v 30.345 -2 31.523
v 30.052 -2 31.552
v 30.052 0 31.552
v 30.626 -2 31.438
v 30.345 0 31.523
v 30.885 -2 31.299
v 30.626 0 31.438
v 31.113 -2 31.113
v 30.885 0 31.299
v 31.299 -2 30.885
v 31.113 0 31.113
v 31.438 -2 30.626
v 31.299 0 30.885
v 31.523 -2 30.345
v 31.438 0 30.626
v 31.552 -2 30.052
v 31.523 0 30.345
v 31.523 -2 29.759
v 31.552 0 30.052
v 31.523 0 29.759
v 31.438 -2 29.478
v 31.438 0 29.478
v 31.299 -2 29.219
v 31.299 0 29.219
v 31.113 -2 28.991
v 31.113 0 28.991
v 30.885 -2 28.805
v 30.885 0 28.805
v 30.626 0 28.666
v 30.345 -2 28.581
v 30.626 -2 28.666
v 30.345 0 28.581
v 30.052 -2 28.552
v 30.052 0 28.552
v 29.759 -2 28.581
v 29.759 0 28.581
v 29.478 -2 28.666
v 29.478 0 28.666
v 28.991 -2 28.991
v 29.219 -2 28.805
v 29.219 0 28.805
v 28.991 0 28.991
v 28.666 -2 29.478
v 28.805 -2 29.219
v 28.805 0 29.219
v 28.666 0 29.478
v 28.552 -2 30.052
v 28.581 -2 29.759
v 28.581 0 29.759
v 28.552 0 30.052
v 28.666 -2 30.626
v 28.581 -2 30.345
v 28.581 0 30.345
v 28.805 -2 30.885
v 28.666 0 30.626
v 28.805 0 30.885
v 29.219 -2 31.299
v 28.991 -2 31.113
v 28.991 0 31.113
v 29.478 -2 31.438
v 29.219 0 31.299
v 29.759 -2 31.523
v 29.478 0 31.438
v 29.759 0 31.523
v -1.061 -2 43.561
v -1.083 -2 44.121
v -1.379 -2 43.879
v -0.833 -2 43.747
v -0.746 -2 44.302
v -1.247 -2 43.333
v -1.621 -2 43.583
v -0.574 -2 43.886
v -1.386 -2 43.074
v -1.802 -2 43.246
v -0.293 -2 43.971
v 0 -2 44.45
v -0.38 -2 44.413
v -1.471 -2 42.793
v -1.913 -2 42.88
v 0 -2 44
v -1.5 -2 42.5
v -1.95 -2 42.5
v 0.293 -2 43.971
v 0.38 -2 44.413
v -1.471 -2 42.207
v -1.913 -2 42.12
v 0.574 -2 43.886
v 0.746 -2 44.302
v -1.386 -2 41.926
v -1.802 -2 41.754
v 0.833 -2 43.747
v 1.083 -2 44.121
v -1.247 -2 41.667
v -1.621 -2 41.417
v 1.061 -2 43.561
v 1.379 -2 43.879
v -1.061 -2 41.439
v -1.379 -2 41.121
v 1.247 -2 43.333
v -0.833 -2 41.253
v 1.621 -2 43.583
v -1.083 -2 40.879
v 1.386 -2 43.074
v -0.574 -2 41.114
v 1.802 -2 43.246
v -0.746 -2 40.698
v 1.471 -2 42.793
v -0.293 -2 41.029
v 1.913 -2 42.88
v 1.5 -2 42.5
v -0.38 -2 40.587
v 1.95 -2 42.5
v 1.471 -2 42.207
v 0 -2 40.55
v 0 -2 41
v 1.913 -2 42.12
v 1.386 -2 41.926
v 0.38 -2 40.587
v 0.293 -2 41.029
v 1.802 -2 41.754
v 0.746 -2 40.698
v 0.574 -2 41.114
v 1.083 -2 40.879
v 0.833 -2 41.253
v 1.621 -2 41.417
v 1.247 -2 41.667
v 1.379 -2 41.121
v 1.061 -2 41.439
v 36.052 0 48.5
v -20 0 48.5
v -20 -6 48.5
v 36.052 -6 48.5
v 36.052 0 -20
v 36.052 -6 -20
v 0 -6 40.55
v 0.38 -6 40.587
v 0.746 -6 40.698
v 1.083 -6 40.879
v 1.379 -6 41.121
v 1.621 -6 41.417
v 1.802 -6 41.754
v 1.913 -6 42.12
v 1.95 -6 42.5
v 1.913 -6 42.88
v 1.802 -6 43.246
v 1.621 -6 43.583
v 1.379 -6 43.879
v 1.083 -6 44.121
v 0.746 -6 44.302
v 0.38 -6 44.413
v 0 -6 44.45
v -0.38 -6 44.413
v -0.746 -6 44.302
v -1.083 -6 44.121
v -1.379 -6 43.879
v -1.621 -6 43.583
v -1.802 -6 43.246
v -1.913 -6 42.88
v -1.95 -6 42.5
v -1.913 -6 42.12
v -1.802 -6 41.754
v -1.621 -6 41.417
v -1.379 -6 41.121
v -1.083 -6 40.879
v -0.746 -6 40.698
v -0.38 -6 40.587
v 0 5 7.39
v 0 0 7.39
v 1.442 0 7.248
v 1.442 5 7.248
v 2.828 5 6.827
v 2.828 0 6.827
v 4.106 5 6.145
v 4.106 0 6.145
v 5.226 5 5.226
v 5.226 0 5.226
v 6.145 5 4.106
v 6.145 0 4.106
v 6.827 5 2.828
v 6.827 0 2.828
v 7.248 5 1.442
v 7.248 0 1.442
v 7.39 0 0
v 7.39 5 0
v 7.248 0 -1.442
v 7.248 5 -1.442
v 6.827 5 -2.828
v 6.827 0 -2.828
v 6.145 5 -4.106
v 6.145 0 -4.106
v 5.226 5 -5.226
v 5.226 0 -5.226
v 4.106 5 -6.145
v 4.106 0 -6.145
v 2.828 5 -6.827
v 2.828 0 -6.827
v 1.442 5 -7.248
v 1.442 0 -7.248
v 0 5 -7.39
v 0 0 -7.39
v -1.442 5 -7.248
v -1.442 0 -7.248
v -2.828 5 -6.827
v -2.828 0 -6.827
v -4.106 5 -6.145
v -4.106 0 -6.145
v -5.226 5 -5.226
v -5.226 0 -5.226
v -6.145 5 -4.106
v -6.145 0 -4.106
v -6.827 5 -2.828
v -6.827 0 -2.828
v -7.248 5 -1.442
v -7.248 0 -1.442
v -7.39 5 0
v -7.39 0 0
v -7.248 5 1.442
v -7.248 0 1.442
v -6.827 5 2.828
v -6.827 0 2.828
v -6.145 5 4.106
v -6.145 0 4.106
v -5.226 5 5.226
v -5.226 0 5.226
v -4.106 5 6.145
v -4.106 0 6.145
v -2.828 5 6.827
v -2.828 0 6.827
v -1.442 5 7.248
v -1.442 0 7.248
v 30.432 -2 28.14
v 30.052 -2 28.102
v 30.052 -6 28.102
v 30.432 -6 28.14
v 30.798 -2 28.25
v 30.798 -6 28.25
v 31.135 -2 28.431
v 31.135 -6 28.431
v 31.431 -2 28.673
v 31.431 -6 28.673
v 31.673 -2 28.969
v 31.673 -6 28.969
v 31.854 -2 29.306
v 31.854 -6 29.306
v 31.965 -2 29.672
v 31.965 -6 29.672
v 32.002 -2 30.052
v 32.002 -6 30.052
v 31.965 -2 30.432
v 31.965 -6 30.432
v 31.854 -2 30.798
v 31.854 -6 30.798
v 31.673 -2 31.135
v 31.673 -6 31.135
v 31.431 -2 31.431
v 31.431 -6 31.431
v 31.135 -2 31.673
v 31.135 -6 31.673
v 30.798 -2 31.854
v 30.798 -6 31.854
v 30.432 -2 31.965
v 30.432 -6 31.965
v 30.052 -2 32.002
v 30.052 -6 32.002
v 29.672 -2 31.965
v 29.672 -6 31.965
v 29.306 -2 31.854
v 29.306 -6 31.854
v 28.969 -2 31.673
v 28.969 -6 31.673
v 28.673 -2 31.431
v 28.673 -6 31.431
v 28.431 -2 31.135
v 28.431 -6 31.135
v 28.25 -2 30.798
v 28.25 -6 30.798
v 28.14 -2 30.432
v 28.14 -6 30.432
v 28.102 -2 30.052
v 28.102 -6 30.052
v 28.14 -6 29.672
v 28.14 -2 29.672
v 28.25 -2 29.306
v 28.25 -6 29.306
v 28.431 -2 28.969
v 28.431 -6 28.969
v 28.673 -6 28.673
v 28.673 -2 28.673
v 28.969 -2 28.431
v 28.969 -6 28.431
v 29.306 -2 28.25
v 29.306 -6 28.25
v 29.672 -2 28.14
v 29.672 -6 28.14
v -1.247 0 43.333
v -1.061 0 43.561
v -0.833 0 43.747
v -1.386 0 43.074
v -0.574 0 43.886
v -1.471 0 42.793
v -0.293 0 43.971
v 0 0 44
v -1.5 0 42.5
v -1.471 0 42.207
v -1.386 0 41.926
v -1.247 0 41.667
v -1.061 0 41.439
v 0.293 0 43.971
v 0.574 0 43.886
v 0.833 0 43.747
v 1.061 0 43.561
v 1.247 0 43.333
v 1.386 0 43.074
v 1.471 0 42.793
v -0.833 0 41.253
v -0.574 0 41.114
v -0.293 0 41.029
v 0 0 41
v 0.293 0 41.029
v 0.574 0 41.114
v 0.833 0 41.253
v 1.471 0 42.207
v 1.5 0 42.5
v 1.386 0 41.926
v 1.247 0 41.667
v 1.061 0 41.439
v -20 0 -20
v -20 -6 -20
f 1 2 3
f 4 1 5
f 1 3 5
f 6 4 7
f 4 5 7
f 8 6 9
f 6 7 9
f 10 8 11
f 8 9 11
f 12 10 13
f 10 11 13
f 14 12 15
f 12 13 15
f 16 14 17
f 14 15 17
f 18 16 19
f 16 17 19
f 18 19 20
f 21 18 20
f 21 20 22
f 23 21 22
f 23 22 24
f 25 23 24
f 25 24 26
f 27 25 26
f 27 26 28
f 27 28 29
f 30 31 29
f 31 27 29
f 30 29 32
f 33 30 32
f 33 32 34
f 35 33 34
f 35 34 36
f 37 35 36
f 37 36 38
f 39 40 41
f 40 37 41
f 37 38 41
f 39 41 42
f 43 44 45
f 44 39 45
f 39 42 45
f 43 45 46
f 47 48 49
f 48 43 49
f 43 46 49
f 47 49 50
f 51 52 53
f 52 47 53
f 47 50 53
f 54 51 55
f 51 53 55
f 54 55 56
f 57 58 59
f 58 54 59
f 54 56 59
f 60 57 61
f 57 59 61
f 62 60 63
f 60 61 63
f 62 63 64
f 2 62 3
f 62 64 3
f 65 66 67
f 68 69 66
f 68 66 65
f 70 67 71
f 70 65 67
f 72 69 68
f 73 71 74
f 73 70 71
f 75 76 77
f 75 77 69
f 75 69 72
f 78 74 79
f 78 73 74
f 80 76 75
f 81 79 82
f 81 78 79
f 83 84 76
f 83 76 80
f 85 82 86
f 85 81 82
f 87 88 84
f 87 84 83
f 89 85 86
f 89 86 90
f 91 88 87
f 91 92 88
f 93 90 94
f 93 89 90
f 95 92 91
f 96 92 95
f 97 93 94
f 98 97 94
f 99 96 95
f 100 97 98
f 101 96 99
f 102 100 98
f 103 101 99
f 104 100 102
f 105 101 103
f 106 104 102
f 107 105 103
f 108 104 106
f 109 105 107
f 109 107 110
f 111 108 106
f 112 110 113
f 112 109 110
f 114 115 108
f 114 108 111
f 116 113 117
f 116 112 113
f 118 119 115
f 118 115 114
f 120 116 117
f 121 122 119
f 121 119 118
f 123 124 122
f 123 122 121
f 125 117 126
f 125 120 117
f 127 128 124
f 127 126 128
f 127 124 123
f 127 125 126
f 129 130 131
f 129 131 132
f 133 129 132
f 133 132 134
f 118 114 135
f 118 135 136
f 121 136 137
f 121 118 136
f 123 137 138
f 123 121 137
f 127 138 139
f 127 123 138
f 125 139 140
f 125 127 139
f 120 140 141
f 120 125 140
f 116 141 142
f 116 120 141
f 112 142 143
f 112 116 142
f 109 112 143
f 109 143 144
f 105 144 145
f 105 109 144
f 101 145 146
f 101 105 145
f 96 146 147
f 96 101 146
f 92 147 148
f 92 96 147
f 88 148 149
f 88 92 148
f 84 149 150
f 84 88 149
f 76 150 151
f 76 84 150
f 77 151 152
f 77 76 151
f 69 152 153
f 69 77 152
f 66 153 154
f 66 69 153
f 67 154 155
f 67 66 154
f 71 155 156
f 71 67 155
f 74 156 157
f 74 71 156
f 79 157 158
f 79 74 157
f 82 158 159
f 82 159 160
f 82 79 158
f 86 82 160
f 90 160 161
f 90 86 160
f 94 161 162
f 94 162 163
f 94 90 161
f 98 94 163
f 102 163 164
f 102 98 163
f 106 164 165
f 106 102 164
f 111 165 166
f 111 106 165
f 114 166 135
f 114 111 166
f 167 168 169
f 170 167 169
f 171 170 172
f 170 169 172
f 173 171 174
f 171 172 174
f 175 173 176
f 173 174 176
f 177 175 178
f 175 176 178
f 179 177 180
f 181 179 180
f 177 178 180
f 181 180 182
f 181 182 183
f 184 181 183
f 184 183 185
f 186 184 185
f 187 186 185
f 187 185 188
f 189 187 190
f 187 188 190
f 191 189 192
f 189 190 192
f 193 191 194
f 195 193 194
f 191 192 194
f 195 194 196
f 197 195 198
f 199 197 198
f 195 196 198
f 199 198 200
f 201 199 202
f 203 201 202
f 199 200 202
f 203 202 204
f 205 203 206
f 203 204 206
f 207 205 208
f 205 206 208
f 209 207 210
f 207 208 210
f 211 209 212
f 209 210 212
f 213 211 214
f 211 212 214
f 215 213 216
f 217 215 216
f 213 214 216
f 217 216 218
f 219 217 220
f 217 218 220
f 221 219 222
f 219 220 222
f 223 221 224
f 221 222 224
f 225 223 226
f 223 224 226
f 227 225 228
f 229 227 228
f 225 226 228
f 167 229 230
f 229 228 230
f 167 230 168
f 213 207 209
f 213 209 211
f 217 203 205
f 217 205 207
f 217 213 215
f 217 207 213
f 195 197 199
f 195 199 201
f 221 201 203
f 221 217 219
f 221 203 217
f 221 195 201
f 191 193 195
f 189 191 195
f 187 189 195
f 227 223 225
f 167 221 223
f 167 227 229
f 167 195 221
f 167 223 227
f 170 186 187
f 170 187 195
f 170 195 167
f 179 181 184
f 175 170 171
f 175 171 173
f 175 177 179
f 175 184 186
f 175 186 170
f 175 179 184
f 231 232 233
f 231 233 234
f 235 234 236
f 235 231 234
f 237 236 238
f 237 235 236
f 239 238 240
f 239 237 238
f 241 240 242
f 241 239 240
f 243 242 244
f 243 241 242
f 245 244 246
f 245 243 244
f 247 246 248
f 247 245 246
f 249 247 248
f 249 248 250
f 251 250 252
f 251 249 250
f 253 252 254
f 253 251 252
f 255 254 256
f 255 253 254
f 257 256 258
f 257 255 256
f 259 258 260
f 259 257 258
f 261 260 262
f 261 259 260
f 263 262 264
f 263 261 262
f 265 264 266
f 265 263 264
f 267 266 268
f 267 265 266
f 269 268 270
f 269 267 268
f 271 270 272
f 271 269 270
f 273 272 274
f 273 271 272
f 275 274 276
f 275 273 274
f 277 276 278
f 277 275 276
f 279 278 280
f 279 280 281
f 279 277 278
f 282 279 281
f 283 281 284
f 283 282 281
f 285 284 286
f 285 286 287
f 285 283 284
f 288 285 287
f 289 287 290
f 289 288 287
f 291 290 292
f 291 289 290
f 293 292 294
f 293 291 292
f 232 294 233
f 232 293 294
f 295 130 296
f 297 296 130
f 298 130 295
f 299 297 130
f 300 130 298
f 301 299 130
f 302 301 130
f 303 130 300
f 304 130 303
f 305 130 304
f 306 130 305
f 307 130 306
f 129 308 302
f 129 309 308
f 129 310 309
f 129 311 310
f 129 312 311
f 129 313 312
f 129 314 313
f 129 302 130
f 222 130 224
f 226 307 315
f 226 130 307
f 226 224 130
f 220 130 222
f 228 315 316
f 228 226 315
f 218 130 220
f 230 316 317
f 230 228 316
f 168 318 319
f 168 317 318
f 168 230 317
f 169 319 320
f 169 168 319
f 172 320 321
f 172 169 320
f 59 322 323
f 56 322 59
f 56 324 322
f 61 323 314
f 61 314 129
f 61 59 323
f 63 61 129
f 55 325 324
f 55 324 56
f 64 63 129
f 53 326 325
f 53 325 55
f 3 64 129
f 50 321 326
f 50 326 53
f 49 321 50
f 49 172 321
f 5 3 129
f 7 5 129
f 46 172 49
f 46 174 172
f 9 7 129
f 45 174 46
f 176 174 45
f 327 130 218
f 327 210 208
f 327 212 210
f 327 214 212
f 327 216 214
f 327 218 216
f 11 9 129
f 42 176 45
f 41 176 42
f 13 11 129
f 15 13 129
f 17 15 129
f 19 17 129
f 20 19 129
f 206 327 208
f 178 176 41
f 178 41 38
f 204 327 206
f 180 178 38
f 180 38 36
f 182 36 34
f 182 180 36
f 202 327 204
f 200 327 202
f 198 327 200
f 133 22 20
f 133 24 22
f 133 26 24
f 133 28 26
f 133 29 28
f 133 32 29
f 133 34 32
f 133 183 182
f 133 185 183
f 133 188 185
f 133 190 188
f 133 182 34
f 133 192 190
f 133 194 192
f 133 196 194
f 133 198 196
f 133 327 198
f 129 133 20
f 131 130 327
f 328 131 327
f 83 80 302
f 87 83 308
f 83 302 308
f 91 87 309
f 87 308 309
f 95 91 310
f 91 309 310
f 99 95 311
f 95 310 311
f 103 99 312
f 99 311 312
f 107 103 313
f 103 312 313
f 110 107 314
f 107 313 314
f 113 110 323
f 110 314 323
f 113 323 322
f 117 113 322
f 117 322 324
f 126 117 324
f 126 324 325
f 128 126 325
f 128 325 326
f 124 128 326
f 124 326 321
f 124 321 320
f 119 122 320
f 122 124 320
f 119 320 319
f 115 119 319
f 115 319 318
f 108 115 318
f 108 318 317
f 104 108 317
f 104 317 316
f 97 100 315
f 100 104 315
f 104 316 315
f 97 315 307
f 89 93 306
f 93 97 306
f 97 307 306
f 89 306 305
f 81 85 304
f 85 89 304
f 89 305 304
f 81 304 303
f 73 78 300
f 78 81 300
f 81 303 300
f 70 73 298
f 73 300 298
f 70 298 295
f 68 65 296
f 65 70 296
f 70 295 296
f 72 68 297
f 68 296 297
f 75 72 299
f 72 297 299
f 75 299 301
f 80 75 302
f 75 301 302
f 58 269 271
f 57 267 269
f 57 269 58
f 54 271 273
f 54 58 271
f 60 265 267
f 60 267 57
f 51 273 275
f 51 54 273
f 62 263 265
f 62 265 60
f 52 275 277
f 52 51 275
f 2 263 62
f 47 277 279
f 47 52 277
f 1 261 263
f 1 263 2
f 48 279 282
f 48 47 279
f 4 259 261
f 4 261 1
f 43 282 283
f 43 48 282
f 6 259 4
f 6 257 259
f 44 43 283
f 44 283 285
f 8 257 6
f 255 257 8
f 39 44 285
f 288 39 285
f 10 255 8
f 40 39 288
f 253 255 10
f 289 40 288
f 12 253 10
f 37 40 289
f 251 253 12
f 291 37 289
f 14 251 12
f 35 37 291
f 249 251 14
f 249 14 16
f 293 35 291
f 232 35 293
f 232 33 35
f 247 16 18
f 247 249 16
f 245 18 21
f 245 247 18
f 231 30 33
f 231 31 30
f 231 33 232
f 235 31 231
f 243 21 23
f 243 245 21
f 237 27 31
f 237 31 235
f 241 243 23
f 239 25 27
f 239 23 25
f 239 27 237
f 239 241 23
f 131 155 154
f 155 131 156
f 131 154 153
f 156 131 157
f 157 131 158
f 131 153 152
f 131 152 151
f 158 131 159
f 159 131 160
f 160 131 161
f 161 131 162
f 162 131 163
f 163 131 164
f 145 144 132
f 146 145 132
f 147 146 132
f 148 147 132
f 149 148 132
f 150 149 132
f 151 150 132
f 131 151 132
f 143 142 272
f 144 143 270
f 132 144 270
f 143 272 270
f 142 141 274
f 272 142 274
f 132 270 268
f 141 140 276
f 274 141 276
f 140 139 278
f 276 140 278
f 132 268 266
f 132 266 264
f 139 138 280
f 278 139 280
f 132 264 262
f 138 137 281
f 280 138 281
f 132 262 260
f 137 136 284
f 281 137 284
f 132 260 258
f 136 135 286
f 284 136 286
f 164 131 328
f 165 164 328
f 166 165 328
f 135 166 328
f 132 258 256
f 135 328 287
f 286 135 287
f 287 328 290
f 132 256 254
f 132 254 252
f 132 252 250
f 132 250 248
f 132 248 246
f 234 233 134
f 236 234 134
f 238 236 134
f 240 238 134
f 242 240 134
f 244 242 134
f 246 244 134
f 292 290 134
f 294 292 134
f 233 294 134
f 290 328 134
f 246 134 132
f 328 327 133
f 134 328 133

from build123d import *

# Parameters (mm, degrees)
SKETCH1_W           = 56.0520382
SKETCH1_H           = 68.5
SKETCH1_R           = 1.5
BOSS_EXTRUDE1_DEPTH = 6
SKETCH1_3_R         = 7.39
BOSS_EXTRUDE2_DEPTH = 5
CUT_EXTRUDE1_START  = -4
SKETCH2_R           = 1.95
SKETCH2_R_2         = 1.5
CUT_EXTRUDE1_DEPTH  = 4


with BuildPart() as part:
    # Sketch1 → Boss-Extrude1 (new body)
    with BuildSketch(Plane(origin=(0, 0, 0), x_dir=(1, 0, 0), z_dir=(0, 1, 0))):
        with Locations((8.0260191, -14.25)):
            Rectangle(SKETCH1_W, SKETCH1_H)
        with Locations((0, -42.5)):
            Circle(SKETCH1_R, mode=Mode.SUBTRACT)
        with Locations((30.0520382, -30.0520382)):
            Circle(SKETCH1_R, mode=Mode.SUBTRACT)
    extrude(amount=-BOSS_EXTRUDE1_DEPTH)

    # Sketch1<3> → Boss-Extrude2 (add)
    with BuildSketch(Plane(origin=(0, 0, 0), x_dir=(1, 0, 0), z_dir=(0, 1, 0))):
        Circle(SKETCH1_3_R)
    extrude(amount=BOSS_EXTRUDE2_DEPTH)

    # Sketch2 → Cut-Extrude1 (cut)
    # profile 1 of 2: a face of its own
    with BuildSketch(Plane.XZ.offset(6).offset(CUT_EXTRUDE1_START)):
        with Locations((0, 42.5)):
            Circle(SKETCH2_R)
        with Locations((0, 42.5)):
            Circle(SKETCH2_R_2, mode=Mode.SUBTRACT)
    # profile 2 of 2: a face of its own
    with BuildSketch(Plane.XZ.offset(6).offset(CUT_EXTRUDE1_START)):
        with Locations((30.0520382, 30.0520382)):
            Circle(SKETCH2_R)
        with Locations((30.0520382, 30.0520382)):
            Circle(SKETCH2_R_2, mode=Mode.SUBTRACT)
    extrude(amount=CUT_EXTRUDE1_DEPTH, mode=Mode.SUBTRACT)


solid = part.part
